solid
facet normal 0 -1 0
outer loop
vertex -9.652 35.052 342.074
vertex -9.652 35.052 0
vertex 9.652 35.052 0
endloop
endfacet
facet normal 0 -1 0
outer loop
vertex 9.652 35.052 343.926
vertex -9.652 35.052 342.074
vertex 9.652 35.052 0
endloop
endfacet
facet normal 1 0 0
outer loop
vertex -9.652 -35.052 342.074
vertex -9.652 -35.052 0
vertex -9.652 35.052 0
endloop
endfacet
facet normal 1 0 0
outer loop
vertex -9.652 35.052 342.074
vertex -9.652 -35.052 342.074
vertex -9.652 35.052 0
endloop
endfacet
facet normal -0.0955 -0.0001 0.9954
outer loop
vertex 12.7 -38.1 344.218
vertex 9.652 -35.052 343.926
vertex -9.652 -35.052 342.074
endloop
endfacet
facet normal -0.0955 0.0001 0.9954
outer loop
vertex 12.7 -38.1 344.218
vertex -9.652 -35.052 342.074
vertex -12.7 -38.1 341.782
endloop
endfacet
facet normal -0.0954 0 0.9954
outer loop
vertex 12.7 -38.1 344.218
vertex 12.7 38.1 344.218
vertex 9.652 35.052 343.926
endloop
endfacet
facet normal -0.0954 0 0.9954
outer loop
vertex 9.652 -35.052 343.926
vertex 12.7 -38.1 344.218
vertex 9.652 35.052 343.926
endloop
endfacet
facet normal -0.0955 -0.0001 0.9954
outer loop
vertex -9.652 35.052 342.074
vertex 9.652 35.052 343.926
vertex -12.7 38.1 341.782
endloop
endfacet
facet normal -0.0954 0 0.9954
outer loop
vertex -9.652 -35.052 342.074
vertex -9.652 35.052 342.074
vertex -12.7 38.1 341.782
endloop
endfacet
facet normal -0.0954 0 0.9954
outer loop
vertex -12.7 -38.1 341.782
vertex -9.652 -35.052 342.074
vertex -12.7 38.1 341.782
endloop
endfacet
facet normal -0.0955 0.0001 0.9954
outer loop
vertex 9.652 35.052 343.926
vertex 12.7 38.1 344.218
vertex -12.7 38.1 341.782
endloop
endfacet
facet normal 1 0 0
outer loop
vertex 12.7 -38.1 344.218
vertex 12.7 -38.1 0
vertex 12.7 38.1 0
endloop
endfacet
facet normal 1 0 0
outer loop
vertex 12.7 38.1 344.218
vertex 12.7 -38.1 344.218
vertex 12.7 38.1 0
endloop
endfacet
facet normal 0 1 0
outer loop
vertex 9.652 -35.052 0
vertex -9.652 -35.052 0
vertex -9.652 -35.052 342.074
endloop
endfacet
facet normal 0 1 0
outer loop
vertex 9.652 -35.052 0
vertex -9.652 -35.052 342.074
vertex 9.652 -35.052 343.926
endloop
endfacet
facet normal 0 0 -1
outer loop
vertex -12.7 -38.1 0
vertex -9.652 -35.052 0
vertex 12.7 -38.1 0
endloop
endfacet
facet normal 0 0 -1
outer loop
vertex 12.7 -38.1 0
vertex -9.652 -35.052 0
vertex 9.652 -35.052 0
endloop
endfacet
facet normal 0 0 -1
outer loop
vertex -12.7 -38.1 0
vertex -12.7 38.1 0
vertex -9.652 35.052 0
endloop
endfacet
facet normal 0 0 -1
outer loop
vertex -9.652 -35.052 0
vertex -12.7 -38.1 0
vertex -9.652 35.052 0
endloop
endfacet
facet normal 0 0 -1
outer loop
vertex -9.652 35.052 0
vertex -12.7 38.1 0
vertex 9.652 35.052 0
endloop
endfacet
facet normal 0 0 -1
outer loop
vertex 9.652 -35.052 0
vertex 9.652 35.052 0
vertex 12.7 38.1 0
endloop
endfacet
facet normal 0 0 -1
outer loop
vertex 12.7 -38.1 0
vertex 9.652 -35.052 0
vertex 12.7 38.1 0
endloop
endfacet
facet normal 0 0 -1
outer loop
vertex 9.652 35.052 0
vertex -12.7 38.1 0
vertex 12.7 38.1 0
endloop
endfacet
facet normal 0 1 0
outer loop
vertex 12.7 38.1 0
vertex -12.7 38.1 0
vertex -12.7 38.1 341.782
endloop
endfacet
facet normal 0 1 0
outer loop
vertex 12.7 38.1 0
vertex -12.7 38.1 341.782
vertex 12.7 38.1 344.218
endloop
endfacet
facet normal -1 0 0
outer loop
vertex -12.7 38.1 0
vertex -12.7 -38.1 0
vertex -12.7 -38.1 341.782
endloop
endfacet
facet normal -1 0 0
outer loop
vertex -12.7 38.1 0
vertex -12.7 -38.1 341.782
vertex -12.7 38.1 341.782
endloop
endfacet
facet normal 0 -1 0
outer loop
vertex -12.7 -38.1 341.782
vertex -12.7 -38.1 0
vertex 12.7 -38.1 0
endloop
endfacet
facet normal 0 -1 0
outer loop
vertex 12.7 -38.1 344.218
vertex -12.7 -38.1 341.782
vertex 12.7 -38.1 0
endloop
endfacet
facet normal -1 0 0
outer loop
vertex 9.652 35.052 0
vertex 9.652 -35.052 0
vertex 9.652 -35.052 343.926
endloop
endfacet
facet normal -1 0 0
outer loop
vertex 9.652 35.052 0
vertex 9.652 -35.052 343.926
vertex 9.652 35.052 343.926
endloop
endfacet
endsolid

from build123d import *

# Parameters (mm, degrees)
SKETCH2_W               = 9.652
SKETCH2_H               = 3.048
SKETCH2_W_2             = 3.048
SKETCH2_H_2             = 35.052
BOSS_EXTRUDE1_DEPTH     = 343
SKETCH3_W               = 25.4
SKETCH3_H               = 76.2
SKETCH3_W_2             = 19.304
SKETCH3_H_2             = 70.104
BOSS_EXTRUDE2_DEPTH     = 50
CUT_EXTRUDE1_DEPTH      = 1
CUT_EXTRUDE1_DEPTH_BACK = 77.2


with BuildPart() as part:
    # Sketch2 → Boss-Extrude1 (new body)
    with BuildSketch(Plane.XY):
        Polygon((-12.7, 0), (-9.652, 0), (-9.652, 35.052), (-9.652, 38.1), (-12.7, 38.1), align=None)
        with Locations((-4.826, 36.576)):
            Rectangle(SKETCH2_W, SKETCH2_H)
        Polygon((0, 38.1), (0, 35.052), (9.652, 35.052), (9.652, 0), (12.7, 0), (12.7, 38.1), align=None)
        with Locations((11.176, -17.526)):
            Rectangle(SKETCH2_W_2, SKETCH2_H_2)
        Polygon((-9.652, -35.052), (-9.652, 0), (-12.7, 0), (-12.7, -38.1), (0, -38.1), (0, -35.052), align=None)
        Polygon((9.652, -35.052), (0, -35.052), (0, -38.1), (12.7, -38.1), (12.7, -35.052), align=None)
    extrude(amount=BOSS_EXTRUDE1_DEPTH)

    # Sketch3 → Boss-Extrude2 (add)
    with BuildSketch(Plane.XY.offset(343)):
        Rectangle(SKETCH3_W, SKETCH3_H)
        Rectangle(SKETCH3_W_2, SKETCH3_H_2, mode=Mode.SUBTRACT)
    extrude(amount=BOSS_EXTRUDE2_DEPTH)

    # Sketch4 → Cut-Extrude1 (cut, two sides)
    with BuildSketch(Plane(origin=(0, 38.1, 0), x_dir=(1, 0, 0), z_dir=(0, 1, 0))) as cut_extrude1_sk:
        Polygon((89.351881, -403.747167587), (94.309709366, -352.043247646), (12.7, -383.524571297), (12.7, -393), (-12.7, -393), (-12.7, -341.782211865), (-94.309709366, -333.956752354), (-99.267537732, -385.660672296), align=None)
        Polygon((12.7, -383.524571297), (94.309709366, -352.043247646), (12.7, -344.217788135), align=None)
        Polygon((12.7, -383.524571297), (12.7, -344.217788135), (0, -343), (-9.501519639, -392.088910403), align=None)
        Polygon((12.7, -393), (12.7, -383.524571297), (-9.501519639, -392.088910403), (0, -343), (-12.7, -341.782211865), (-12.7, -393), align=None)
    extrude(amount=CUT_EXTRUDE1_DEPTH, mode=Mode.SUBTRACT)
    extrude(cut_extrude1_sk.sketch, amount=-CUT_EXTRUDE1_DEPTH_BACK, mode=Mode.SUBTRACT)


solid = part.part
